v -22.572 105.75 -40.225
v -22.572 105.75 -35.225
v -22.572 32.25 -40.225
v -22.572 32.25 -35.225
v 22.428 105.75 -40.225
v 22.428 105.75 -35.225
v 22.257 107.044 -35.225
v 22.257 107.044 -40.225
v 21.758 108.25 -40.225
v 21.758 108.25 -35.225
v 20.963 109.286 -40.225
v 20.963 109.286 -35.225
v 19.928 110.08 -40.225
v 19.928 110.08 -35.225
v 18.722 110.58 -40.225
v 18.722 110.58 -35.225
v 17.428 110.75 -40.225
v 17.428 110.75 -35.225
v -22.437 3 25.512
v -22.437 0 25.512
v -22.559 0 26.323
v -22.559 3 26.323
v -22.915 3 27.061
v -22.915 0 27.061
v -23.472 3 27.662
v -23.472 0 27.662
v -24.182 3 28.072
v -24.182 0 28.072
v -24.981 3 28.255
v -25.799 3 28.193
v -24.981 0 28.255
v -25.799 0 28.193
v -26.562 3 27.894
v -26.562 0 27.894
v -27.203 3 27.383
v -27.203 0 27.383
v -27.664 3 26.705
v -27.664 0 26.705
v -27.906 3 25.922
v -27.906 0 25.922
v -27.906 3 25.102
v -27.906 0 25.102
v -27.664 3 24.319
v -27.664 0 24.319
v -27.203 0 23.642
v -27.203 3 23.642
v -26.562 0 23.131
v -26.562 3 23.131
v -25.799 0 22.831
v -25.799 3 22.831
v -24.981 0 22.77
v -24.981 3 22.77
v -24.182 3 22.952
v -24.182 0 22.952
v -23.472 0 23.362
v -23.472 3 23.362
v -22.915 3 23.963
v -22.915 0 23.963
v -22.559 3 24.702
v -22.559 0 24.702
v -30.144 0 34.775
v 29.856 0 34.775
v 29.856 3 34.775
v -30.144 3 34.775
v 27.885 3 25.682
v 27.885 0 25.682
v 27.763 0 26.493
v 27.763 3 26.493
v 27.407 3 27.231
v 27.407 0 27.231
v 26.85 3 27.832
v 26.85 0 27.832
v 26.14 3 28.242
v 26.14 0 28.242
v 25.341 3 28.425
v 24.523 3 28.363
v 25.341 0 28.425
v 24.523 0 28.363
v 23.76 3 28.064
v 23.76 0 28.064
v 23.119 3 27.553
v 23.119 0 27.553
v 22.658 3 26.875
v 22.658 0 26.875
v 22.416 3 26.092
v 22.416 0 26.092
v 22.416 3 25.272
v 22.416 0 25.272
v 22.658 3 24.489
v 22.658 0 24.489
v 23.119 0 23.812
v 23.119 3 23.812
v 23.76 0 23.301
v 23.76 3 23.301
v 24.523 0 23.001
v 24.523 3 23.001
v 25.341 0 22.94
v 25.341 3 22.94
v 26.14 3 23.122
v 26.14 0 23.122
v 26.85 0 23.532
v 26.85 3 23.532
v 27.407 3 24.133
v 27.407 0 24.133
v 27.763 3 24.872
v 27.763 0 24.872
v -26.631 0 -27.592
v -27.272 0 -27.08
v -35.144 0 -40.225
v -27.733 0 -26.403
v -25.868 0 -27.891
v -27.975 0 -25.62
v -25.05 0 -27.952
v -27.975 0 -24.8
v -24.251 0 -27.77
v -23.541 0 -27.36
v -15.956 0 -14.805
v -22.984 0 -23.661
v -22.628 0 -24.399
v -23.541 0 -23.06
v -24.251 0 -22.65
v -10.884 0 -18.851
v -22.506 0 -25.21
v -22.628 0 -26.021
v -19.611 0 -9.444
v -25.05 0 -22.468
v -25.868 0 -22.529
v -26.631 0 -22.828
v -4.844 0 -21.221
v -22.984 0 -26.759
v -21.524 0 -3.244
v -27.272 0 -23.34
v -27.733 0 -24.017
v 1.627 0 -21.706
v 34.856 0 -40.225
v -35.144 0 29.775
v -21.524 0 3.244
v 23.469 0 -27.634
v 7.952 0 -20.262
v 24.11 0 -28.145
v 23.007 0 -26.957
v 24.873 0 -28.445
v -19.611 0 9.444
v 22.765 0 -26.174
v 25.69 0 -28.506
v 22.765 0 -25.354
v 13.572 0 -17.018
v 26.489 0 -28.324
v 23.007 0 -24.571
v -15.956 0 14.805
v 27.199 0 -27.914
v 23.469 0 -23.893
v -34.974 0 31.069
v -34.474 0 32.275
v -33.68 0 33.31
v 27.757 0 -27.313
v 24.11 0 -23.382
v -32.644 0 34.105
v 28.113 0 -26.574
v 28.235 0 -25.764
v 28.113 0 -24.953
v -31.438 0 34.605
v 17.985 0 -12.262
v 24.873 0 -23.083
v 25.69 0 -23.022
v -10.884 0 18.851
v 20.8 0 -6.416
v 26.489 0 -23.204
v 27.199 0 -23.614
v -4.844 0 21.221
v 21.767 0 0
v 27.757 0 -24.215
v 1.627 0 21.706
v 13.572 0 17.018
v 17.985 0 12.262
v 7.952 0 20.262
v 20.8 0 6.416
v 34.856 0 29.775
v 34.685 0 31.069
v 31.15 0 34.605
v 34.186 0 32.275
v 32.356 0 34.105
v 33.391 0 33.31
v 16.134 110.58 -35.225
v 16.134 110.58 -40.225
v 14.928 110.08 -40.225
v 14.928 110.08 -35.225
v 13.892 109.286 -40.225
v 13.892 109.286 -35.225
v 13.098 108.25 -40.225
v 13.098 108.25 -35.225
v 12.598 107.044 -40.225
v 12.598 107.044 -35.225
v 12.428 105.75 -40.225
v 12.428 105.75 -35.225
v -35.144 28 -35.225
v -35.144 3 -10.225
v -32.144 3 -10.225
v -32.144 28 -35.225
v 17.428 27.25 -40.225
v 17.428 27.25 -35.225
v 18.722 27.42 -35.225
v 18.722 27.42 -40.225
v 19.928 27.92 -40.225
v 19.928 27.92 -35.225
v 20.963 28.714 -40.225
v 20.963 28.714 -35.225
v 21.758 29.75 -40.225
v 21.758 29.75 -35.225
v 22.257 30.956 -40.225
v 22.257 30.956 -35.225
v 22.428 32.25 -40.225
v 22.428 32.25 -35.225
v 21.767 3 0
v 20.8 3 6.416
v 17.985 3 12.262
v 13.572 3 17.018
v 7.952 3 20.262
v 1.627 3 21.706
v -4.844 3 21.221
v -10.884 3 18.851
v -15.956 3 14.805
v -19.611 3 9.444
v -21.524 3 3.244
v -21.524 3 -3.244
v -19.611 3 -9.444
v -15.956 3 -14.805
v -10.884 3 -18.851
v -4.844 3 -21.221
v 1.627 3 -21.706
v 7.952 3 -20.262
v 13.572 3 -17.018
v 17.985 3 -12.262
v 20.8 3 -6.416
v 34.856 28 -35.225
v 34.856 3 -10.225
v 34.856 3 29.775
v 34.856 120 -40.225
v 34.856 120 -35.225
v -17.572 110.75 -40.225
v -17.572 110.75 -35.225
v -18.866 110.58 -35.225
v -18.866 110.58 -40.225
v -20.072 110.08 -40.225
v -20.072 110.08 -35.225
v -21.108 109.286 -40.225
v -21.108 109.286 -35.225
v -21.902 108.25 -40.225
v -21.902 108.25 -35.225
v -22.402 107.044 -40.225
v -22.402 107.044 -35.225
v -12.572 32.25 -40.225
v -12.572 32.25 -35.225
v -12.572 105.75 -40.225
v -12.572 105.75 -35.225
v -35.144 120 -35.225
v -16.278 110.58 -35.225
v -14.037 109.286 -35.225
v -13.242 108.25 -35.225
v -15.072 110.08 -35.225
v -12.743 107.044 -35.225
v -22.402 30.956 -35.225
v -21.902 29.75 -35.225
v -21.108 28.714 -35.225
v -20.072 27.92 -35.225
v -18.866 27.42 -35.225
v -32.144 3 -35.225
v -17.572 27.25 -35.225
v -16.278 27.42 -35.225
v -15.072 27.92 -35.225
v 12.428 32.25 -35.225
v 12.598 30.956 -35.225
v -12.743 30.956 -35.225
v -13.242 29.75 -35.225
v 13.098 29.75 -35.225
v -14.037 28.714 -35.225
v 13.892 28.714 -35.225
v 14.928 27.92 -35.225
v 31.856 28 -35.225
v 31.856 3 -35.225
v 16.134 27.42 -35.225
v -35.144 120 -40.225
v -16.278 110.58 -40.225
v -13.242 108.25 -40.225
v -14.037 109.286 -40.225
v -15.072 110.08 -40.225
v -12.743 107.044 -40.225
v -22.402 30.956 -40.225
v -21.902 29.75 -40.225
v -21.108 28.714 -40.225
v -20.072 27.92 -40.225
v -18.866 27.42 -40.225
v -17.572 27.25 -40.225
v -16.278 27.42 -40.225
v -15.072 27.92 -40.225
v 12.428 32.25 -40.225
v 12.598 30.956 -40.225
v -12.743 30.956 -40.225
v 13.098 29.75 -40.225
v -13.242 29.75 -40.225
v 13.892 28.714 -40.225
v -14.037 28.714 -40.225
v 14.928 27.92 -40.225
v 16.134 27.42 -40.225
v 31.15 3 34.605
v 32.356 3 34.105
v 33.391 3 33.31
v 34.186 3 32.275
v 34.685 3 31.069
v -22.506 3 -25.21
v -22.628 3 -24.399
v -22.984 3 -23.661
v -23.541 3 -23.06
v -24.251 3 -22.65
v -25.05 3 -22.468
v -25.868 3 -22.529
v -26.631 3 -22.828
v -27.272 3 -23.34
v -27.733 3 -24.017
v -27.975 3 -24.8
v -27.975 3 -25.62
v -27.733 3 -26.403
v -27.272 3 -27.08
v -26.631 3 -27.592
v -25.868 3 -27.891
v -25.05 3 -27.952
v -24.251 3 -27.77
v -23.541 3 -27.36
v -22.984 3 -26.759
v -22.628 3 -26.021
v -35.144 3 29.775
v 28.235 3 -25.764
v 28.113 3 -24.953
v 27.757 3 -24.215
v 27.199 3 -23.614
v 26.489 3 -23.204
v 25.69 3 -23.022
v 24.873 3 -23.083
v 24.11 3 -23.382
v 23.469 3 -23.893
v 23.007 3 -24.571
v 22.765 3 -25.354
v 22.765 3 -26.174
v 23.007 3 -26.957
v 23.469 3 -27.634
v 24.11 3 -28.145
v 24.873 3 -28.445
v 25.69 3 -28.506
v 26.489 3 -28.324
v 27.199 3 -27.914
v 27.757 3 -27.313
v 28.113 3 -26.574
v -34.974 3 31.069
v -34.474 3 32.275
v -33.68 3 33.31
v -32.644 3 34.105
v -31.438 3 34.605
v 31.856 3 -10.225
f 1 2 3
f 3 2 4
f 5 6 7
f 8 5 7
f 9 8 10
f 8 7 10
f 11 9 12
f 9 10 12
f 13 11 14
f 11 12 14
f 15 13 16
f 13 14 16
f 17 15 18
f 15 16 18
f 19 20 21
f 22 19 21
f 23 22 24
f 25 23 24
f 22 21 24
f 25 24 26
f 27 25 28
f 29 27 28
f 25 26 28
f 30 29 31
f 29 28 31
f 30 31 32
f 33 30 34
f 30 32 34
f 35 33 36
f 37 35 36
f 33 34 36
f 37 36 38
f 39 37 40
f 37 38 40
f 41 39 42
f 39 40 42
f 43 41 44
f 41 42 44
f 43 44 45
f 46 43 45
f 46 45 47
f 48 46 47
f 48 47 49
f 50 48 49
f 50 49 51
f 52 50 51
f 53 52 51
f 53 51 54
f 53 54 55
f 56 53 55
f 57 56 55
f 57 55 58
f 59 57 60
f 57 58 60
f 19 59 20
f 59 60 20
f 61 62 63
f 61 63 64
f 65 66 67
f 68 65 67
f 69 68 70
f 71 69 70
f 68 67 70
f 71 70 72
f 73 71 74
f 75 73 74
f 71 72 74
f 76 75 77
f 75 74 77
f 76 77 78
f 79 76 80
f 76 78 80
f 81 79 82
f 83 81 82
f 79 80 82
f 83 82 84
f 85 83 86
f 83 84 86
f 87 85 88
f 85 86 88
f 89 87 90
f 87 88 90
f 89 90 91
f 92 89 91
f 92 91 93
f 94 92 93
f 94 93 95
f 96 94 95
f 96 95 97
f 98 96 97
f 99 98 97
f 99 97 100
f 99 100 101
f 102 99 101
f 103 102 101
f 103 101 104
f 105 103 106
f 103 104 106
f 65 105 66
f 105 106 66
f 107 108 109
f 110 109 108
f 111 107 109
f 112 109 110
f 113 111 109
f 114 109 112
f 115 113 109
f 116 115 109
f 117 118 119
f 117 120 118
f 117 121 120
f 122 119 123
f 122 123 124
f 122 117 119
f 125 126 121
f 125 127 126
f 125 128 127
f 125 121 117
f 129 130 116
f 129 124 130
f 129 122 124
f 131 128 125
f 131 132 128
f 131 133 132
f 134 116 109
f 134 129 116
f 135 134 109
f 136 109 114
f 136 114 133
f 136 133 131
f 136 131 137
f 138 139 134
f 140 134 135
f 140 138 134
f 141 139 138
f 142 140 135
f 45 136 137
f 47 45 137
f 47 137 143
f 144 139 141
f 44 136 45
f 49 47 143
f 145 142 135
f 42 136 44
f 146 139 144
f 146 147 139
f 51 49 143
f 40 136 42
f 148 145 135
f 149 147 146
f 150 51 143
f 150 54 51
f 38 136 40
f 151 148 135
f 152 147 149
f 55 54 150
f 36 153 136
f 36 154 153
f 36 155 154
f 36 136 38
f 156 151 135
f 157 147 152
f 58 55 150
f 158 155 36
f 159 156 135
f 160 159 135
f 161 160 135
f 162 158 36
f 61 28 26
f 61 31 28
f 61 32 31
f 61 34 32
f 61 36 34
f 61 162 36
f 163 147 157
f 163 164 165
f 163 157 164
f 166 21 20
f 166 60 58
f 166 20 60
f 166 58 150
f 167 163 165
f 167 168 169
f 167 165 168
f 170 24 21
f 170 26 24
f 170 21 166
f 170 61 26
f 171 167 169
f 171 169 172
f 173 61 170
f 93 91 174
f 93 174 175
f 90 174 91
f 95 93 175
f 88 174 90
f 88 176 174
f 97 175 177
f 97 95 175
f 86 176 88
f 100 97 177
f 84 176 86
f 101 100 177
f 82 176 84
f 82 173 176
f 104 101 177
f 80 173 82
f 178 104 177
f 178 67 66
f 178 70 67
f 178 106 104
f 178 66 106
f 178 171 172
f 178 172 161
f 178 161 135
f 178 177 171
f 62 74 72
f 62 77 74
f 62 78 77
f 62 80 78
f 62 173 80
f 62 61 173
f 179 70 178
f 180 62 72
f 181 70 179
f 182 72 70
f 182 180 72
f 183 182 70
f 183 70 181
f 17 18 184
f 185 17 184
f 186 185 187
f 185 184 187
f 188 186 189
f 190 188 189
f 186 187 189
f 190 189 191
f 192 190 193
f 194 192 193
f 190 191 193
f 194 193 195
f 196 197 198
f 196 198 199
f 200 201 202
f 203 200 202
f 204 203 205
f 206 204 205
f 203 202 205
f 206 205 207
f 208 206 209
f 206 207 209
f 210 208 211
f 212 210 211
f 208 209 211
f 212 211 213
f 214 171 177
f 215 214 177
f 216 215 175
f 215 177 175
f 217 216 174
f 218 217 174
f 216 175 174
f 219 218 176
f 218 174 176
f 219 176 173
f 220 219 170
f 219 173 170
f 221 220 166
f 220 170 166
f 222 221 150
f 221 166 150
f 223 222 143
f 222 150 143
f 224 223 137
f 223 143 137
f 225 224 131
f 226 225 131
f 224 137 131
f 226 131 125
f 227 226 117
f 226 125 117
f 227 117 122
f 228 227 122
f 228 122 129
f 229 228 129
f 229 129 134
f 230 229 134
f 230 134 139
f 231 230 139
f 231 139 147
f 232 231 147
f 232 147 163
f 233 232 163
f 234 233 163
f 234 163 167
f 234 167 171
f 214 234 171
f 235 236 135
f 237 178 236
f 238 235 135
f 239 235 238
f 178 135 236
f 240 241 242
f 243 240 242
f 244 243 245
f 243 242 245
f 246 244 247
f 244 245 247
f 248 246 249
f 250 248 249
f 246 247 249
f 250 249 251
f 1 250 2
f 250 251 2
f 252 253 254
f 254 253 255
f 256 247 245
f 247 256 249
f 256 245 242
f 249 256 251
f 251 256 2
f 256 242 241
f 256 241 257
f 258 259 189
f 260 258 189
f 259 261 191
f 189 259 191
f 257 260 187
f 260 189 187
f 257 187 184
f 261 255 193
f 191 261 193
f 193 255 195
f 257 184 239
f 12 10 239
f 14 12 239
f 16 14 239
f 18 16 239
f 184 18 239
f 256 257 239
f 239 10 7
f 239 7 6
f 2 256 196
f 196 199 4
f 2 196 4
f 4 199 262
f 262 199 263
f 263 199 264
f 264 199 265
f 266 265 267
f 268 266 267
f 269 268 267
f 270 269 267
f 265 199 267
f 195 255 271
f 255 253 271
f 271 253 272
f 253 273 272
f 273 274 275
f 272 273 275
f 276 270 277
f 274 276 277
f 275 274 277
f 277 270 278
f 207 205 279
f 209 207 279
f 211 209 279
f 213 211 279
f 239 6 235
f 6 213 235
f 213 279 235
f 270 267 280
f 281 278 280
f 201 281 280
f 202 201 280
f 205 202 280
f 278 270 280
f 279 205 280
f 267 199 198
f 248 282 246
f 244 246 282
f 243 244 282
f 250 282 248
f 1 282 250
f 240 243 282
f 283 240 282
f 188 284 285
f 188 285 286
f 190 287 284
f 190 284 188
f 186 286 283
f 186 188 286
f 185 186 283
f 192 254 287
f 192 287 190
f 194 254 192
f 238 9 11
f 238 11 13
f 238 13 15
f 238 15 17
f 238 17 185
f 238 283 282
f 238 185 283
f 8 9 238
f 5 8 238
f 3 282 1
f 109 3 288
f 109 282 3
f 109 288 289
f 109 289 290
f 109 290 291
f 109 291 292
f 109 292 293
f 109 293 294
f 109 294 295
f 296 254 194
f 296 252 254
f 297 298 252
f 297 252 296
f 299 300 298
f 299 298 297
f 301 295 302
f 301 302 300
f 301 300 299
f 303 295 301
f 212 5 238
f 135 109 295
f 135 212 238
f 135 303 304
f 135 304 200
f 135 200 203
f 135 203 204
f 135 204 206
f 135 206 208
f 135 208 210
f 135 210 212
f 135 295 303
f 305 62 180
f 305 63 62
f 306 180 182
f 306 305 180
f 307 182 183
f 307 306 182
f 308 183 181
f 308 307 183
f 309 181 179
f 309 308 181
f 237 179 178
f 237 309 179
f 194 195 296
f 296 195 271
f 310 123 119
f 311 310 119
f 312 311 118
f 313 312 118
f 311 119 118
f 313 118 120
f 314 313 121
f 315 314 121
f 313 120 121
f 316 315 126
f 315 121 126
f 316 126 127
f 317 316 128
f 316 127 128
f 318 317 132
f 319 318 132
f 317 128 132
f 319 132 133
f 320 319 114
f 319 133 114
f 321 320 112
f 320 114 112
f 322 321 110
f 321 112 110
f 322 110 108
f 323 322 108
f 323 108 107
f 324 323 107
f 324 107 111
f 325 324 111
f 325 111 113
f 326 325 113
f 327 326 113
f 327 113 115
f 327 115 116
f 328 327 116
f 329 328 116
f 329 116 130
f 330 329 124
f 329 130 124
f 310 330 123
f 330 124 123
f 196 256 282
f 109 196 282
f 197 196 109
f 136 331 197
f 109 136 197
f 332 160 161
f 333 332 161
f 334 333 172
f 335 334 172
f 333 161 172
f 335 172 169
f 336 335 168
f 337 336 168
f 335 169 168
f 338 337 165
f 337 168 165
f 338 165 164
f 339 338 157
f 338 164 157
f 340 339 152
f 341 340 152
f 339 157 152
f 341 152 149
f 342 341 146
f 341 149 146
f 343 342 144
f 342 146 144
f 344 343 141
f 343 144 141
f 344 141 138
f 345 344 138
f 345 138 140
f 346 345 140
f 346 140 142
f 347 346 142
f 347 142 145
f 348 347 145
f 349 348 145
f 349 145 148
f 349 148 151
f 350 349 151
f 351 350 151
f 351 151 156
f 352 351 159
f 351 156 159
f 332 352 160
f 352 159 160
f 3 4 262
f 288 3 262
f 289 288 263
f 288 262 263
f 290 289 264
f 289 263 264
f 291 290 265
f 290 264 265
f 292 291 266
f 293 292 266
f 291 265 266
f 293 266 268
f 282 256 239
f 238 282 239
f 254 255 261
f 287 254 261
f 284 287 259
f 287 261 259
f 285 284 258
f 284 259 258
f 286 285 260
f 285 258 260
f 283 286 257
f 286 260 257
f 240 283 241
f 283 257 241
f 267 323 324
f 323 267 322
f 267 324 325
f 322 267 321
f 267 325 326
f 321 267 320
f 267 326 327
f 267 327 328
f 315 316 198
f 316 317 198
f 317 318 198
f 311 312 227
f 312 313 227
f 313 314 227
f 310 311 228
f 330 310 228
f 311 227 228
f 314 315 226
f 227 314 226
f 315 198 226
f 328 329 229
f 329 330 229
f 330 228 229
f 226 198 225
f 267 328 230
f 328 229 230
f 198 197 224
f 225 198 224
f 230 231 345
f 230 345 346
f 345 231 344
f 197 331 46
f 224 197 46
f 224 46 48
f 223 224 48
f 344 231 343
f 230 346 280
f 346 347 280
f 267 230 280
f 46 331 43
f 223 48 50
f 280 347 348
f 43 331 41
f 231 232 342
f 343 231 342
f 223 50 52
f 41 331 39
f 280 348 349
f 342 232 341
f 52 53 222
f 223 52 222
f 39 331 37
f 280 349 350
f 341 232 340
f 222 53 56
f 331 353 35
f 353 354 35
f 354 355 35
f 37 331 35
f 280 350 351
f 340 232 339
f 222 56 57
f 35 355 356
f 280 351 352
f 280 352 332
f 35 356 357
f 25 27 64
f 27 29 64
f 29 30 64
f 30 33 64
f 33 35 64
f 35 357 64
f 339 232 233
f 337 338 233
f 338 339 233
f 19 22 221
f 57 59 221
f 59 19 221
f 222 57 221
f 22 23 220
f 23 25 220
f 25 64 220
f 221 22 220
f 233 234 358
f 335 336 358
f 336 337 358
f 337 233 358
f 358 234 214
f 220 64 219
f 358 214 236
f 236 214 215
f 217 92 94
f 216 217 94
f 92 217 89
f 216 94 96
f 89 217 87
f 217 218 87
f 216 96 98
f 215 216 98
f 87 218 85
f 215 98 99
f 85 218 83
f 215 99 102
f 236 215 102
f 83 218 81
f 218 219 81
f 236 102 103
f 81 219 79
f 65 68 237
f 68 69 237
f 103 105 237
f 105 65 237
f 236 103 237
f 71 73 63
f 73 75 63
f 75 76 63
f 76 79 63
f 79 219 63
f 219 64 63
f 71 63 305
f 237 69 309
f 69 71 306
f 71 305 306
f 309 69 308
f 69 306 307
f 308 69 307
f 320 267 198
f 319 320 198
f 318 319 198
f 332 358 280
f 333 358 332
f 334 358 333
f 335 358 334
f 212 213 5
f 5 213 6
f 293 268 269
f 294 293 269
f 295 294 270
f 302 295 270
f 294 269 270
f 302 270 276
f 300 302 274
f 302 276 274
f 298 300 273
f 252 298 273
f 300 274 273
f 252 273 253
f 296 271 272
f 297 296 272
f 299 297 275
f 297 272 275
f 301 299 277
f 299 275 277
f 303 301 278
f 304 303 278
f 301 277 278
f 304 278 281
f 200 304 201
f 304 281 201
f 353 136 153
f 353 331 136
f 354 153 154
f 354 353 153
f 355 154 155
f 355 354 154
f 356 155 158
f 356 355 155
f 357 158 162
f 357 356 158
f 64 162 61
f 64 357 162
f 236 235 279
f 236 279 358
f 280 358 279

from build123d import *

# Parameters (mm, degrees)
F0_R      = 2.75
F1_DEPTH  = 3
F2_R      = 21.767
F3_DEPTH  = 25
F0_W      = 70
F0_H      = 5
F4_DEPTH  = 120
F6_DEPTH  = 25
F7_R      = 5
F9_DEPTH  = 3
F11_DEPTH = 3


# Not quite as in the source:
# - a feature names something its author has since deleted; it is built from what else it names


with BuildPart() as f1:
    # F0 (on Front) → F1 (new body)
    with BuildSketch(Plane.XZ):
        Polygon((-35.1443272789, 34.7749316851), (-35.1443272789, -30.2250683149), (-35.1443272789, -35.2250683149), (34.8556727211, -35.2250683149), (34.8556727211, 34.7749316851), align=None)
        Polygon((29.8556727211, -20.9088045945), (29.8556727211, -30.2250683149), (21.0454399179, -30.2250683149), (-20.0690244843, -30.2250683149), (-30.1443272789, -30.2250683149), (-30.1443272789, -20.0232621124), (-30.1443272789, 20.9646839807), (-30.1443272789, 29.7749316851), (-20.9545706917, 29.7749316851), (20.6652218889, 29.7749316851), (29.8556727211, 29.7749316851), (29.8556727211, 20.9646914313), align=None, mode=Mode.SUBTRACT)
        Polygon((-20.0690244843, -30.2250683149), (21.0454399179, -30.2250683149), (21.0454399179, -23.8184407195), (23.5755527805, -20.9088045945), (29.8556727211, -20.9088045945), (29.8556727211, 20.9646914313), (22.6900065731, 20.9646914313), (20.6652218889, 22.609265537), (20.6652218889, 29.7749316851), (-20.9545706917, 29.7749316851), (-20.9545706917, 23.6213151524), (-23.6111795117, 20.9646839807), (-30.1443272789, 20.9646839807), (-30.1443272789, -20.0232621124), (-22.8521441628, -20.0232621124), (-20.0690244843, -22.5533824255), align=None)
        Polygon((-30.1443272789, 29.7749316851), (-30.1443272789, 20.9646839807), (-23.6111795117, 20.9646839807), (-20.9545706917, 23.6213151524), (-20.9545706917, 29.7749316851), align=None)
        with Locations((-25.186798494, 25.5123097608)):
            Circle(F0_R, mode=Mode.SUBTRACT)
        Polygon((22.6900065731, 20.9646914313), (29.8556727211, 20.9646914313), (29.8556727211, 29.7749316851), (20.6652218889, 29.7749316851), (20.6652218889, 22.609265537), align=None)
        with Locations((25.1352448512, 25.6822819479)):
            Circle(F0_R, mode=Mode.SUBTRACT)
        Polygon((-30.1443272789, -30.2250683149), (-20.0690244843, -30.2250683149), (-20.0690244843, -22.5533824255), (-22.8521441628, -20.0232621124), (-30.1443272789, -20.0232621124), align=None)
        with Locations((-25.255761068, -25.2100098719)):
            Circle(F0_R, mode=Mode.SUBTRACT)
        Polygon((21.0454399179, -30.2250683149), (29.8556727211, -30.2250683149), (29.8556727211, -20.9088045945), (23.5755527805, -20.9088045945), (21.0454399179, -23.8184407195), align=None)
        with Locations((25.4847700376, -25.7638242348)):
            Circle(F0_R, mode=Mode.SUBTRACT)
    extrude(amount=-F1_DEPTH)

    # F2 (on face) → F3 (cut)
    with BuildSketch(Plane.XZ):
        Circle(F2_R)
    extrude(amount=-F3_DEPTH, mode=Mode.SUBTRACT)

    # F0 (on Front) → F4 (join)
    with BuildSketch(Plane.XZ):
        with Locations((-0.1443272789, -37.7250683149)):
            Rectangle(F0_W, F0_H)
    extrude(amount=-F4_DEPTH)

    # F5 (on face) → F6 (cut)
    with BuildSketch(Plane.XY.offset(-35.2250683149)):
        with BuildLine():
            Line((-17.5721636394, 90.75), (-12.5721636394, 90.75))
            ThreePointArc((-12.5721636394, 90.75), (-14.0366297335, 94.2855339059), (-17.5721636394, 95.75))
            Line((-17.5721636394, 95.75), (-17.5721636394, 90.75))
        make_face()
        with BuildLine():
            ThreePointArc((-17.5721636394, 95.75), (-21.1076975454, 94.2855339059), (-22.5721636394, 90.75))
            Line((-22.5721636394, 90.75), (-17.5721636394, 90.75))
            Line((-17.5721636394, 90.75), (-17.5721636394, 95.75))
        make_face()
        with BuildLine():
            Line((-17.5721636394, 90.75), (-22.5721636394, 90.75))
            ThreePointArc((-22.5721636394, 90.75), (-21.1076975454, 87.2144660941), (-17.5721636394, 85.75))
            Line((-17.5721636394, 85.75), (-17.5721636394, 90.75))
        make_face()
        with BuildLine():
            ThreePointArc((-17.5721636394, 85.75), (-14.0366297335, 87.2144660941), (-12.5721636394, 90.75))
            Line((-12.5721636394, 90.75), (-17.5721636394, 90.75))
            Line((-17.5721636394, 90.75), (-17.5721636394, 85.75))
        make_face()
        with BuildLine():
            Line((-12.5721636394, 32.25), (-12.5721636394, 90.75))
            ThreePointArc((-12.5721636394, 90.75), (-14.0366297335, 87.2144660941), (-17.5721636394, 85.75))
            Line((-17.5721636394, 85.75), (-17.5721636394, 37.25))
            ThreePointArc((-17.5721636394, 37.25), (-14.0366297335, 35.7855339059), (-12.5721636394, 32.25))
        make_face()
        with BuildLine():
            ThreePointArc((-17.5721636394, 85.75), (-21.1076975454, 87.2144660941), (-22.5721636394, 90.75))
            Line((-22.5721636394, 90.75), (-22.5721636394, 32.25))
            ThreePointArc((-22.5721636394, 32.25), (-21.1076975454, 35.7855339059), (-17.5721636394, 37.25))
            Line((-17.5721636394, 37.25), (-17.5721636394, 85.75))
        make_face()
        with BuildLine():
            ThreePointArc((-17.5721636394, 37.25), (-21.1076975454, 35.7855339059), (-22.5721636394, 32.25))
            Line((-22.5721636394, 32.25), (-17.5721636394, 32.25))
            Line((-17.5721636394, 32.25), (-17.5721636394, 37.25))
        make_face()
        with BuildLine():
            Line((-17.5721636394, 32.25), (-12.5721636394, 32.25))
            ThreePointArc((-12.5721636394, 32.25), (-14.0366297335, 35.7855339059), (-17.5721636394, 37.25))
            Line((-17.5721636394, 37.25), (-17.5721636394, 32.25))
        make_face()
        with BuildLine():
            ThreePointArc((-17.5721636394, 27.25), (-14.0366297335, 28.7144660941), (-12.5721636394, 32.25))
            Line((-12.5721636394, 32.25), (-17.5721636394, 32.25))
            Line((-17.5721636394, 32.25), (-17.5721636394, 27.25))
        make_face()
        with BuildLine():
            Line((-17.5721636394, 32.25), (-22.5721636394, 32.25))
            ThreePointArc((-22.5721636394, 32.25), (-21.1076975454, 28.7144660941), (-17.5721636394, 27.25))
            Line((-17.5721636394, 27.25), (-17.5721636394, 32.25))
        make_face()
        with BuildLine():
            Line((22.4278363606, 32.25), (22.4278363606, 90.75))
            ThreePointArc((22.4278363606, 90.75), (20.9633702665, 87.2144660941), (17.4278363606, 85.75))
            Line((17.4278363606, 85.75), (17.4278363606, 37.25))
            ThreePointArc((17.4278363606, 37.25), (20.9633702665, 35.7855339059), (22.4278363606, 32.25))
        make_face()
        with BuildLine():
            Line((17.4278363606, 90.75), (12.4278363606, 90.75))
            ThreePointArc((12.4278363606, 90.75), (13.8923024546, 87.2144660941), (17.4278363606, 85.75))
            Line((17.4278363606, 85.75), (17.4278363606, 90.75))
        make_face()
        with BuildLine():
            ThreePointArc((17.4278363606, 95.75), (13.8923024546, 94.2855339059), (12.4278363606, 90.75))
            Line((12.4278363606, 90.75), (17.4278363606, 90.75))
            Line((17.4278363606, 90.75), (17.4278363606, 95.75))
        make_face()
        with BuildLine():
            Line((17.4278363606, 90.75), (22.4278363606, 90.75))
            ThreePointArc((22.4278363606, 90.75), (20.9633702665, 94.2855339059), (17.4278363606, 95.75))
            Line((17.4278363606, 95.75), (17.4278363606, 90.75))
        make_face()
        with BuildLine():
            ThreePointArc((17.4278363606, 85.75), (20.9633702665, 87.2144660941), (22.4278363606, 90.75))
            Line((22.4278363606, 90.75), (17.4278363606, 90.75))
            Line((17.4278363606, 90.75), (17.4278363606, 85.75))
        make_face()
        with BuildLine():
            ThreePointArc((17.4278363606, 85.75), (13.8923024546, 87.2144660941), (12.4278363606, 90.75))
            Line((12.4278363606, 90.75), (12.4278363606, 32.25))
            ThreePointArc((12.4278363606, 32.25), (13.8923024546, 35.7855339059), (17.4278363606, 37.25))
            Line((17.4278363606, 37.25), (17.4278363606, 85.75))
        make_face()
        with BuildLine():
            ThreePointArc((17.4278363606, 37.25), (13.8923024546, 35.7855339059), (12.4278363606, 32.25))
            Line((12.4278363606, 32.25), (17.4278363606, 32.25))
            Line((17.4278363606, 32.25), (17.4278363606, 37.25))
        make_face()
        with BuildLine():
            Line((17.4278363606, 32.25), (22.4278363606, 32.25))
            ThreePointArc((22.4278363606, 32.25), (20.9633702665, 35.7855339059), (17.4278363606, 37.25))
            Line((17.4278363606, 37.25), (17.4278363606, 32.25))
        make_face()
        with BuildLine():
            ThreePointArc((17.4278363606, 27.25), (20.9633702665, 28.7144660941), (22.4278363606, 32.25))
            Line((22.4278363606, 32.25), (17.4278363606, 32.25))
            Line((17.4278363606, 32.25), (17.4278363606, 27.25))
        make_face()
        with BuildLine():
            Line((17.4278363606, 32.25), (12.4278363606, 32.25))
            ThreePointArc((12.4278363606, 32.25), (13.8923024546, 28.7144660941), (17.4278363606, 27.25))
            Line((17.4278363606, 27.25), (17.4278363606, 32.25))
        make_face()
        with BuildLine():
            ThreePointArc((-17.5721636394, 100.75), (-21.1076975454, 102.2144660941), (-22.5721636394, 105.75))
            Line((-22.5721636394, 105.75), (-22.5721636394, 90.75))
            ThreePointArc((-22.5721636394, 90.75), (-21.1076975454, 94.2855339059), (-17.5721636394, 95.75))
            Line((-17.5721636394, 95.75), (-17.5721636394, 100.75))
        make_face()
        with BuildLine():
            Line((-12.5721636394, 90.75), (-12.5721636394, 105.75))
            ThreePointArc((-12.5721636394, 105.75), (-14.0366297335, 102.2144660941), (-17.5721636394, 100.75))
            Line((-17.5721636394, 100.75), (-17.5721636394, 95.75))
            ThreePointArc((-17.5721636394, 95.75), (-14.0366297335, 94.2855339059), (-12.5721636394, 90.75))
        make_face()
        with BuildLine():
            ThreePointArc((17.4278363606, 100.75), (13.8923024546, 102.2144660941), (12.4278363606, 105.75))
            Line((12.4278363606, 105.75), (12.4278363606, 90.75))
            ThreePointArc((12.4278363606, 90.75), (13.8923024546, 94.2855339059), (17.4278363606, 95.75))
            Line((17.4278363606, 95.75), (17.4278363606, 100.75))
        make_face()
        with BuildLine():
            Line((22.4278363606, 90.75), (22.4278363606, 105.75))
            ThreePointArc((22.4278363606, 105.75), (20.9633702665, 102.2144660941), (17.4278363606, 100.75))
            Line((17.4278363606, 100.75), (17.4278363606, 95.75))
            ThreePointArc((17.4278363606, 95.75), (20.9633702665, 94.2855339059), (22.4278363606, 90.75))
        make_face()
        with BuildLine():
            Line((22.4278363606, 105.75), (17.4278363606, 105.75))
            Line((17.4278363606, 105.75), (17.4278363606, 100.75))
            ThreePointArc((17.4278363606, 100.75), (20.9633702665, 102.2144660941), (22.4278363606, 105.75))
        make_face()
        with BuildLine():
            ThreePointArc((22.4278363606, 105.75), (20.9633702665, 109.2855339059), (17.4278363606, 110.75))
            Line((17.4278363606, 110.75), (17.4278363606, 105.75))
            Line((17.4278363606, 105.75), (22.4278363606, 105.75))
        make_face()
        with BuildLine():
            Line((17.4278363606, 105.75), (17.4278363606, 110.75))
            ThreePointArc((17.4278363606, 110.75), (13.8923024546, 109.2855339059), (12.4278363606, 105.75))
            Line((12.4278363606, 105.75), (17.4278363606, 105.75))
        make_face()
        with BuildLine():
            Line((-17.5721636394, 105.75), (-17.5721636394, 110.75))
            ThreePointArc((-17.5721636394, 110.75), (-21.1076975454, 109.2855339059), (-22.5721636394, 105.75))
            Line((-22.5721636394, 105.75), (-17.5721636394, 105.75))
        make_face()
        with BuildLine():
            ThreePointArc((-12.5721636394, 105.75), (-14.0366297335, 109.2855339059), (-17.5721636394, 110.75))
            Line((-17.5721636394, 110.75), (-17.5721636394, 105.75))
            Line((-17.5721636394, 105.75), (-12.5721636394, 105.75))
        make_face()
        with BuildLine():
            Line((-12.5721636394, 105.75), (-17.5721636394, 105.75))
            Line((-17.5721636394, 105.75), (-17.5721636394, 100.75))
            ThreePointArc((-17.5721636394, 100.75), (-14.0366297335, 102.2144660941), (-12.5721636394, 105.75))
        make_face()
        with BuildLine():
            Line((-17.5721636394, 105.75), (-22.5721636394, 105.75))
            ThreePointArc((-22.5721636394, 105.75), (-21.1076975454, 102.2144660941), (-17.5721636394, 100.75))
            Line((-17.5721636394, 100.75), (-17.5721636394, 105.75))
        make_face()
        with BuildLine():
            Line((17.4278363606, 105.75), (12.4278363606, 105.75))
            ThreePointArc((12.4278363606, 105.75), (13.8923024546, 102.2144660941), (17.4278363606, 100.75))
            Line((17.4278363606, 100.75), (17.4278363606, 105.75))
        make_face()
    extrude(amount=-F6_DEPTH, mode=Mode.SUBTRACT)

    # F7
    f7_edges = [f1.edges().sort_by_distance(p)[0] for p in [
        (-35.144327, 1.5, 34.774932),
        (34.855673, 1.5, 34.774932),
    ]]
    fillet(f7_edges, radius=F7_R)

    # F8 (on face) → F9 (join)
    with BuildSketch(Plane(origin=(-35.1443272789, 0, 0), x_dir=(0, -1, 0), z_dir=(-1, 0, 0))):
        Polygon((-28, -35.2250683149), (-3, -35.2250683149), (-3, -10.2250683149), align=None)
    extrude(amount=-F9_DEPTH)

    # F10 (on face) → F11 (join)
    with BuildSketch(Plane.YZ.offset(34.8556727211)):
        Polygon((3, -10.2250683149), (3, -35.2250683149), (28, -35.2250683149), align=None)
    extrude(amount=-F11_DEPTH)


solid = f1.part
